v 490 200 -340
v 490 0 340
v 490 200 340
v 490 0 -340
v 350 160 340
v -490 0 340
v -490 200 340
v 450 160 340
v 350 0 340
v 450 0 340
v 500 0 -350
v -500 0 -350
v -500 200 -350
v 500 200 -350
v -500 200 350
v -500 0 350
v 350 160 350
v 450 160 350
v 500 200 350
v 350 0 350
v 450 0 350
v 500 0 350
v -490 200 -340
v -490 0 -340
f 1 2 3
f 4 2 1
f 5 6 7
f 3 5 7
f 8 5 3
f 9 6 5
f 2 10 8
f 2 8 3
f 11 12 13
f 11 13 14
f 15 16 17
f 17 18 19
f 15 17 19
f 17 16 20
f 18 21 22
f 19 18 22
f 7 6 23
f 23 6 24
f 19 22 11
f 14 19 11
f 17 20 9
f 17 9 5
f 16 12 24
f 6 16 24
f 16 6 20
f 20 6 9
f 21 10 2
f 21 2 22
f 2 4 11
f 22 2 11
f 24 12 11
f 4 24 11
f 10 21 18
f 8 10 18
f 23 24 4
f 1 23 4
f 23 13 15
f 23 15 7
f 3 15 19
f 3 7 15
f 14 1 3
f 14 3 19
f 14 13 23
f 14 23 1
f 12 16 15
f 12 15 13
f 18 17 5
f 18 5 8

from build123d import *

# Parameters (mm, degrees)
SKETCH1_W           = 1000
SKETCH1_H           = 700
SKETCH1_W_2         = 980
SKETCH1_H_2         = 680
BOSS_EXTRUDE1_DEPTH = 200
SKETCH2_W           = 100
SKETCH2_H           = 160
CUT_EXTRUDE1_DEPTH  = 200


with BuildPart() as part:
    # Sketch1 → Boss-Extrude1 (new body)
    with BuildSketch(Plane(origin=(0, 0, 0), x_dir=(1, 0, 0), z_dir=(0, 1, 0))):
        Rectangle(SKETCH1_W, SKETCH1_H)
        Rectangle(SKETCH1_W_2, SKETCH1_H_2, mode=Mode.SUBTRACT)
    extrude(amount=BOSS_EXTRUDE1_DEPTH)

    # Sketch2 → Cut-Extrude1 (cut)
    with BuildSketch(Plane.XY.offset(350)):
        with Locations((400, 80)):
            Rectangle(SKETCH2_W, SKETCH2_H)
    extrude(amount=-CUT_EXTRUDE1_DEPTH, mode=Mode.SUBTRACT)


solid = part.part
